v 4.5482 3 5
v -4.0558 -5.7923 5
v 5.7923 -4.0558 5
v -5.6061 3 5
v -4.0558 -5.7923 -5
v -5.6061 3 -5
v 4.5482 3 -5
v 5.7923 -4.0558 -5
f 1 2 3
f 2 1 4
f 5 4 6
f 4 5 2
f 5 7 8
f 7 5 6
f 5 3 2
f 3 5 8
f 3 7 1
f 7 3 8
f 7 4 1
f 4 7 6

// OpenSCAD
difference() {
    rotate([0,0,10]) {
        cube(10, center=true);
    }
    translate([0, 13, 0]) {
        cube(20, center=true);
    }
}
